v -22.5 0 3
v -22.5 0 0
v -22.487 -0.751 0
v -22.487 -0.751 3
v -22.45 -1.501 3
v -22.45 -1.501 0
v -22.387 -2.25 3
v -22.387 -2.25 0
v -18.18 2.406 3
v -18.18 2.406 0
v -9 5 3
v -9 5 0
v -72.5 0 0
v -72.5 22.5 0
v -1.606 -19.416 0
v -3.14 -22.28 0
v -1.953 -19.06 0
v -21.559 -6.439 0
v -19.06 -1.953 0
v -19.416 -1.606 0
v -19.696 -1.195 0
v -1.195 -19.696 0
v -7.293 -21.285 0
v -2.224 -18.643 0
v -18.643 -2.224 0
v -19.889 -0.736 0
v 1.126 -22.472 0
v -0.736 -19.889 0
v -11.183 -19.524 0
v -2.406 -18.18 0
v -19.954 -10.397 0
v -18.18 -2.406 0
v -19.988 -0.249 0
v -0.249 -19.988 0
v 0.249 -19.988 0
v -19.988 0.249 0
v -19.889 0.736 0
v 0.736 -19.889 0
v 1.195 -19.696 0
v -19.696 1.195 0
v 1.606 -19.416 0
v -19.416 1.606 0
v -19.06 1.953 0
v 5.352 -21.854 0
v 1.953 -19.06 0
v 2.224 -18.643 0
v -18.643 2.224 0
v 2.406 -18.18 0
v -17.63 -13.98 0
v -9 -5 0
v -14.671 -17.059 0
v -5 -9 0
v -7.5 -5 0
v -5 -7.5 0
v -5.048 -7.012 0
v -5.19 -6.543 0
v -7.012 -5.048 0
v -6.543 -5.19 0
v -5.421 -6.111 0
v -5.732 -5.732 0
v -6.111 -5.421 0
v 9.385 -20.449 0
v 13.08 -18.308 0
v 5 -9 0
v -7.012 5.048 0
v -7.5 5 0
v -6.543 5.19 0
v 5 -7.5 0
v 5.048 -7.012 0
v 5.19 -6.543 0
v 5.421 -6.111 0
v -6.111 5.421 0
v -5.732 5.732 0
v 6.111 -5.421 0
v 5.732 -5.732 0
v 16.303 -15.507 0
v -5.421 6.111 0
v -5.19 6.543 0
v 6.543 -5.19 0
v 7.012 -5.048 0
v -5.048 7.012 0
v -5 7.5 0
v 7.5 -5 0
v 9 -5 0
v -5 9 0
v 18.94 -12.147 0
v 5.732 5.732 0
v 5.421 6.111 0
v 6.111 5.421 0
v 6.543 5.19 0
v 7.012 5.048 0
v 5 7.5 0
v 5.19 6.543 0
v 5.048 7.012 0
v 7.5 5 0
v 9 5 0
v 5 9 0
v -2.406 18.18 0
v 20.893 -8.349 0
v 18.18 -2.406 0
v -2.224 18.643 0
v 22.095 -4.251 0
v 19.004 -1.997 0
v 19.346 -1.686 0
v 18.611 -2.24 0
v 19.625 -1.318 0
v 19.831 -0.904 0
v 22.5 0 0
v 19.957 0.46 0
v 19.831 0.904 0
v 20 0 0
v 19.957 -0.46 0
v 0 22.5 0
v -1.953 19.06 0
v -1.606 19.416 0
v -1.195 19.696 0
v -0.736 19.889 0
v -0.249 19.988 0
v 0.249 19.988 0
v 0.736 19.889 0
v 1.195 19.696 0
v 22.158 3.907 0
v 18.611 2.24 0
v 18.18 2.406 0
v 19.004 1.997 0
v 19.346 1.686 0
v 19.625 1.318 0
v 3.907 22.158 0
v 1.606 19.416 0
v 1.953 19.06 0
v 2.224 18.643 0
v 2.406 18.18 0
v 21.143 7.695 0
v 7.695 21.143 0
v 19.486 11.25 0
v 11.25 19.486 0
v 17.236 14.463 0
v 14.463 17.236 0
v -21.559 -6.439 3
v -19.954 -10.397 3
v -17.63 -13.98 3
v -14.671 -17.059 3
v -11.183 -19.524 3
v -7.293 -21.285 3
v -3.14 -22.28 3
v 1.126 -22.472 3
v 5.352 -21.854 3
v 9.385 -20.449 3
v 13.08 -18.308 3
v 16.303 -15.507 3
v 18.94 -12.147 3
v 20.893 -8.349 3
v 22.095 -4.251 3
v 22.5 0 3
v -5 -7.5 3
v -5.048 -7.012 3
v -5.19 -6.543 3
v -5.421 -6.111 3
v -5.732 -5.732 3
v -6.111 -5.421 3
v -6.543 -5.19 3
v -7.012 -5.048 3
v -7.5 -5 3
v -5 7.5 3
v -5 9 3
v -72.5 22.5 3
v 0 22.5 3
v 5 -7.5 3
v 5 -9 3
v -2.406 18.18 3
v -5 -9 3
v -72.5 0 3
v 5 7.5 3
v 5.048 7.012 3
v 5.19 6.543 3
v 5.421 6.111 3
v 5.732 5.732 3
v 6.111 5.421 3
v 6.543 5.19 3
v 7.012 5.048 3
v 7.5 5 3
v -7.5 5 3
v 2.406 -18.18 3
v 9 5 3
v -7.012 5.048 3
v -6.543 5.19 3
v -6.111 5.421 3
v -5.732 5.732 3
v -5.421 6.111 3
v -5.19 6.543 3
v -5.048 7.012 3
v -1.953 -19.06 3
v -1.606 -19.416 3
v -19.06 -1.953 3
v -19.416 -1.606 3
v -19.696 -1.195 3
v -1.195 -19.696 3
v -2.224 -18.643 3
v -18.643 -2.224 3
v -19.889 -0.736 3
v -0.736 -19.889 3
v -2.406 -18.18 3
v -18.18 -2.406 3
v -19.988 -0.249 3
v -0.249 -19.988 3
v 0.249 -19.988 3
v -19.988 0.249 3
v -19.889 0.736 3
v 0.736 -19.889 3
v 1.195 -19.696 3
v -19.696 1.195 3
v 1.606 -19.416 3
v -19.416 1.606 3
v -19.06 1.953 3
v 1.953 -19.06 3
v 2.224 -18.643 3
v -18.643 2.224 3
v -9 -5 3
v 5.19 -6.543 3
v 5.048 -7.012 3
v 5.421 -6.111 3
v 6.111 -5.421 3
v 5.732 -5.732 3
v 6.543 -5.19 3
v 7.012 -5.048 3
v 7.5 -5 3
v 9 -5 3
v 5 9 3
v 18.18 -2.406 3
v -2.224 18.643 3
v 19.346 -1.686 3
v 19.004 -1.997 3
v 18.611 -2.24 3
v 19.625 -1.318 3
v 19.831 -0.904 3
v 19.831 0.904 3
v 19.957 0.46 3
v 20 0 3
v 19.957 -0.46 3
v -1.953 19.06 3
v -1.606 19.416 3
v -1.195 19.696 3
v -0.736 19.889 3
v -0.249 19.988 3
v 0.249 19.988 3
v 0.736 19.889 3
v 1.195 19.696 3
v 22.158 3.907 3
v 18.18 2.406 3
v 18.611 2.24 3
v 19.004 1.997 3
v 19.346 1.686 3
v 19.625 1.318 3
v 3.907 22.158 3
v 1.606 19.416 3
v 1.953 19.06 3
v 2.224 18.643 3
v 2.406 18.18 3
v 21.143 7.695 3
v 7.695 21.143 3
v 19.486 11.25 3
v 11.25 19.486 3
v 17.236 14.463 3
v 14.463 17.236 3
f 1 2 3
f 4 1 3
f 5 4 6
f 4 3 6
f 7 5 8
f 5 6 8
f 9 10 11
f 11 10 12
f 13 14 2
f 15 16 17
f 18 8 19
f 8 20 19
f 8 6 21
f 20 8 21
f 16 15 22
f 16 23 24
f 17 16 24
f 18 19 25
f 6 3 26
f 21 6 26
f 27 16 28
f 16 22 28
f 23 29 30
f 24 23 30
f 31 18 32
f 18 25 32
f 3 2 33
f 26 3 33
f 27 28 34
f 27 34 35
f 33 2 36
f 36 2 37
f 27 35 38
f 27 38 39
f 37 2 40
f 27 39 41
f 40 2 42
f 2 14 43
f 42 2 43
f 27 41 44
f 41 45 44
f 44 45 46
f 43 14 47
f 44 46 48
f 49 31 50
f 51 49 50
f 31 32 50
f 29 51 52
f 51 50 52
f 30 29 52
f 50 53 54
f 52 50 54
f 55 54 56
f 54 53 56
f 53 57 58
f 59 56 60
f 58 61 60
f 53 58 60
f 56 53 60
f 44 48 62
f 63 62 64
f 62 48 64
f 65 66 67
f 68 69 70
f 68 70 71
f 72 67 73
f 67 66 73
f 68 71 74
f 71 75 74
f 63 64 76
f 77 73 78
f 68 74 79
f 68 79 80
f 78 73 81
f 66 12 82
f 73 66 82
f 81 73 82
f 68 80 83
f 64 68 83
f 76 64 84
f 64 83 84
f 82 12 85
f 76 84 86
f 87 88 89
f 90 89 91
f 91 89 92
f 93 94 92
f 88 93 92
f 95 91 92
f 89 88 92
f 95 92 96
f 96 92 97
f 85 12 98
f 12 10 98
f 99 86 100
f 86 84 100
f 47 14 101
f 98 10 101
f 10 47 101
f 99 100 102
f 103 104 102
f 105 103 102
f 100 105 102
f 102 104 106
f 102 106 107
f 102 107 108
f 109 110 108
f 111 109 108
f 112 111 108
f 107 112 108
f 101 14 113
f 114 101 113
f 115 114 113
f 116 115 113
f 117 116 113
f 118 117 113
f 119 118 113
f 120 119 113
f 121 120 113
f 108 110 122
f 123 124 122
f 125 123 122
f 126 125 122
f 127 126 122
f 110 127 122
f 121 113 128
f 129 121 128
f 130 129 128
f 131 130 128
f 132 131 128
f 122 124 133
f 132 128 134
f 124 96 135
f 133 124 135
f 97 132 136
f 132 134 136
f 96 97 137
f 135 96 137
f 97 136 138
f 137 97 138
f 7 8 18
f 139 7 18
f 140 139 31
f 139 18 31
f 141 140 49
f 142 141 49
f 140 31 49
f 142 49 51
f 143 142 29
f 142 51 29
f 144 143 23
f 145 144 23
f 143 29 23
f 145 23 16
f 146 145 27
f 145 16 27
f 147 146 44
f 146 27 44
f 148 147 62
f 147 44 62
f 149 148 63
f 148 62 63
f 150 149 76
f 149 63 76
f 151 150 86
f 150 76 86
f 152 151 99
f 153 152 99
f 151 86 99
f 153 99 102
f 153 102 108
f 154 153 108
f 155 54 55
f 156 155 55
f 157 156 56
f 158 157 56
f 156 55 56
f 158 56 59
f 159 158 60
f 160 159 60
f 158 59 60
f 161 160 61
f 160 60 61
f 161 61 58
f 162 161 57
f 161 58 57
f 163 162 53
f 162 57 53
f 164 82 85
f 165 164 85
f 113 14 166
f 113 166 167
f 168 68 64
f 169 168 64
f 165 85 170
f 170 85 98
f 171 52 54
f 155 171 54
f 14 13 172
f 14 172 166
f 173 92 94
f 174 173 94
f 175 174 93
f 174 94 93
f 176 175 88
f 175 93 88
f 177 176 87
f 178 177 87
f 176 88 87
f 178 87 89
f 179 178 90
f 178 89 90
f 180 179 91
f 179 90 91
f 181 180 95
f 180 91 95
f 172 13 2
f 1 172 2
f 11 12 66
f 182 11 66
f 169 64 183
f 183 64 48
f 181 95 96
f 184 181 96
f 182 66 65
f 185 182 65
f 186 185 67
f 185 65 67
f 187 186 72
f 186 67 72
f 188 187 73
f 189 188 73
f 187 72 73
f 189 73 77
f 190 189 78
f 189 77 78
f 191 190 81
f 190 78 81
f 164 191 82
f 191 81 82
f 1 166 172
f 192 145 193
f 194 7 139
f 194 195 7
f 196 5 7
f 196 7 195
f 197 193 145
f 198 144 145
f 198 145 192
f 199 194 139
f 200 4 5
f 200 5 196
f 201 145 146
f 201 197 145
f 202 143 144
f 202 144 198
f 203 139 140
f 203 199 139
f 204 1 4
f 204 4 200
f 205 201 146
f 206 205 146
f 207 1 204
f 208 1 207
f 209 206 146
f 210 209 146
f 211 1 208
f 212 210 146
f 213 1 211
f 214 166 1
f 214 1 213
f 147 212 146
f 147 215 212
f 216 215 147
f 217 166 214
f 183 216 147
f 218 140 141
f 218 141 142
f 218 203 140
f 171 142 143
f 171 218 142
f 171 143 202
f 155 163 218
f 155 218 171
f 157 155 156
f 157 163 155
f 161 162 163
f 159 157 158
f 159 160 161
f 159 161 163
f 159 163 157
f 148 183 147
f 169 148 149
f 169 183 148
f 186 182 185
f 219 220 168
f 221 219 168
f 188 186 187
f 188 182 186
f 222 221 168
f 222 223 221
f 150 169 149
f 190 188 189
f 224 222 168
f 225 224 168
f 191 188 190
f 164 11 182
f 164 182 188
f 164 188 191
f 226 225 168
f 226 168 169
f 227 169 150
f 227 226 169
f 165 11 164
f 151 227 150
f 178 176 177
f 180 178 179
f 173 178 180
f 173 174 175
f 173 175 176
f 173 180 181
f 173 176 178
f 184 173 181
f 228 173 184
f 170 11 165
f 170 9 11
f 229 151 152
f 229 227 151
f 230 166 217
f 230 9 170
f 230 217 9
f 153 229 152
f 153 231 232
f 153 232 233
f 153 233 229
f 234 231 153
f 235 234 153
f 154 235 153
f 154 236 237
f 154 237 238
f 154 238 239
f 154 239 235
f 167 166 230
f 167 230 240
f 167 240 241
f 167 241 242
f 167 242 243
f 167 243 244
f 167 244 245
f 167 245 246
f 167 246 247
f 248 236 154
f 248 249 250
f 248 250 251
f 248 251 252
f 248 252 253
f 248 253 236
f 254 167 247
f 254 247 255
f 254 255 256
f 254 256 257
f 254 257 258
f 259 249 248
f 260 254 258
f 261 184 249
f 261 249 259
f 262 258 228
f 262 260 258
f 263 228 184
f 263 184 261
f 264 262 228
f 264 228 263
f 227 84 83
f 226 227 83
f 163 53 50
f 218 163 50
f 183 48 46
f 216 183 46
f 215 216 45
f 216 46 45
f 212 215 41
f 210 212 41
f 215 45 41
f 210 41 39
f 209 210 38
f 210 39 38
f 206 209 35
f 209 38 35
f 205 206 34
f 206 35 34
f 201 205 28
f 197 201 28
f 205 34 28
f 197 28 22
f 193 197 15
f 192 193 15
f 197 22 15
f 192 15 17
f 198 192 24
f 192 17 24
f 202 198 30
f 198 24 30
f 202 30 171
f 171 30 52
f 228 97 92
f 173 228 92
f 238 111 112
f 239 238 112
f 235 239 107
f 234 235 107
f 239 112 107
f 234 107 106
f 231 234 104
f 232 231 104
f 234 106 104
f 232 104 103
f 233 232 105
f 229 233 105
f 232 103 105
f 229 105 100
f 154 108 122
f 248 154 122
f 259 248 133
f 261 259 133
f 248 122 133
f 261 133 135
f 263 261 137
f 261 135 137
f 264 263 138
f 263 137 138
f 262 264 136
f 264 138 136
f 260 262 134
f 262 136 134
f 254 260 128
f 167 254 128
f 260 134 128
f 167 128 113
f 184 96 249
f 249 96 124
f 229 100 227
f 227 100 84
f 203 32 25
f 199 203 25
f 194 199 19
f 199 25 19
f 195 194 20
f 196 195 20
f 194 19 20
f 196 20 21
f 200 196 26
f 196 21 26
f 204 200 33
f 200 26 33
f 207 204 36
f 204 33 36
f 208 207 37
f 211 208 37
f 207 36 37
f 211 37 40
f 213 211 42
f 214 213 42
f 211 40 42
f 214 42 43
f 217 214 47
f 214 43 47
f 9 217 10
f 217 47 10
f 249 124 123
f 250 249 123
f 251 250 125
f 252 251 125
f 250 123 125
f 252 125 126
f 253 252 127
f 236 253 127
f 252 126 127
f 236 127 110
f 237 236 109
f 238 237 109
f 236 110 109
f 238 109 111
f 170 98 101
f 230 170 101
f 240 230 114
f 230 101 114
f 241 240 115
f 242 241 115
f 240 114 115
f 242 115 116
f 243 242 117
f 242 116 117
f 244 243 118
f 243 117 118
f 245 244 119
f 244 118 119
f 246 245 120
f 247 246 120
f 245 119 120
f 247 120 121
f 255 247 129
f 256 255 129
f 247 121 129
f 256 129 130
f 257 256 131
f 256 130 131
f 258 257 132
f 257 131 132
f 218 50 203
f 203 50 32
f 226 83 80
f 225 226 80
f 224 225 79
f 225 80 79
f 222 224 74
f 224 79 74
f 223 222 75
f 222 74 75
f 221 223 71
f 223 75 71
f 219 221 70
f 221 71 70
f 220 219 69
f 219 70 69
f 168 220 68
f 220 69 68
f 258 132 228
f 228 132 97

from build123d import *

# Parameters (mm, degrees)
SKETCH1_R           = 2.5
SKETCH1_W           = 50
SKETCH1_H           = 22.5
BOSS_EXTRUDE1_DEPTH = 3


with BuildPart() as part:
    # Sketch1 → Boss-Extrude1 (new body)
    # profile 1 of 7: a face of its own
    with BuildSketch(Plane.XY):
        with BuildLine():
            ThreePointArc((22.5, 0), (15.909902577, 15.909902577), (0, 22.5))
            Line((0, 22.5), (-22.5, 0))
            ThreePointArc((-22.5, 0), (-22.471786645, -1.126412439), (-22.387217335, -2.25))
            ThreePointArc((-22.387217335, -2.25), (1.126412439, -22.471786645), (22.5, 0))
        make_face()
        with BuildLine():
            ThreePointArc((-7.5, 5), (-9.267766953, 9.267766953), (-5, 7.5))
            Line((-5, 7.5), (-5, 9))
            Line((-5, 9), (-2.405779746, 18.179870439))
            ThreePointArc((-2.405779746, 18.179870439), (0, 20), (2.405779746, 18.179870439))
            Line((2.405779746, 18.179870439), (5, 9))
            Line((5, 9), (5, 7.5))
            ThreePointArc((5, 7.5), (7.5, 10), (10, 7.5))
            ThreePointArc((10, 7.5), (9.267766953, 5.732233047), (7.5, 5))
            Line((7.5, 5), (9, 5))
            Line((9, 5), (18.179870439, 2.405779746))
            ThreePointArc((18.179870439, 2.405779746), (19.493699588, 1.508363998), (20, 0))
            ThreePointArc((20, 0), (19.493699588, -1.508363998), (18.179870439, -2.405779746))
            Line((18.179870439, -2.405779746), (9, -5))
            Line((9, -5), (7.5, -5))
            ThreePointArc((7.5, -5), (9.267766953, -5.732233047), (10, -7.5))
            ThreePointArc((10, -7.5), (7.5, -10), (5, -7.5))
            Line((5, -7.5), (5, -9))
            Line((5, -9), (2.405779746, -18.179870439))
            ThreePointArc((2.405779746, -18.179870439), (0, -20), (-2.405779746, -18.179870439))
            Line((-2.405779746, -18.179870439), (-5, -9))
            Line((-5, -9), (-5, -7.5))
            ThreePointArc((-5, -7.5), (-9.267766953, -9.267766953), (-7.5, -5))
            Line((-7.5, -5), (-9, -5))
            Line((-9, -5), (-18.179870439, -2.405779746))
            ThreePointArc((-18.179870439, -2.405779746), (-20, 0), (-18.179870439, 2.405779746))
            Line((-18.179870439, 2.405779746), (-9, 5))
            Line((-9, 5), (-7.5, 5))
        make_face(mode=Mode.SUBTRACT)
    # profile 2 of 7: a face of its own
    with BuildSketch(Plane.XY):
        with Locations((-7.5, 7.5)):
            Circle(SKETCH1_R)
    # profile 3 of 7: a face of its own
    with BuildSketch(Plane.XY):
        with Locations((7.5, 7.5)):
            Circle(SKETCH1_R)
    # profile 4 of 7: a face of its own
    with BuildSketch(Plane.XY):
        with Locations((7.5, -7.5)):
            Circle(SKETCH1_R)
    # profile 5 of 7: a face of its own
    with BuildSketch(Plane.XY):
        with Locations((-7.5, -7.5)):
            Circle(SKETCH1_R)
    # profile 6 of 7: a face of its own
    with BuildSketch(Plane.XY):
        Polygon((-22.5, 22.5), (0, 22.5), (-22.5, 0), align=None)
    # profile 7 of 7: a face of its own
    with BuildSketch(Plane.XY):
        with Locations((-47.5, 11.25)):
            Rectangle(SKETCH1_W, SKETCH1_H)
    extrude(amount=BOSS_EXTRUDE1_DEPTH)


solid = part.part
